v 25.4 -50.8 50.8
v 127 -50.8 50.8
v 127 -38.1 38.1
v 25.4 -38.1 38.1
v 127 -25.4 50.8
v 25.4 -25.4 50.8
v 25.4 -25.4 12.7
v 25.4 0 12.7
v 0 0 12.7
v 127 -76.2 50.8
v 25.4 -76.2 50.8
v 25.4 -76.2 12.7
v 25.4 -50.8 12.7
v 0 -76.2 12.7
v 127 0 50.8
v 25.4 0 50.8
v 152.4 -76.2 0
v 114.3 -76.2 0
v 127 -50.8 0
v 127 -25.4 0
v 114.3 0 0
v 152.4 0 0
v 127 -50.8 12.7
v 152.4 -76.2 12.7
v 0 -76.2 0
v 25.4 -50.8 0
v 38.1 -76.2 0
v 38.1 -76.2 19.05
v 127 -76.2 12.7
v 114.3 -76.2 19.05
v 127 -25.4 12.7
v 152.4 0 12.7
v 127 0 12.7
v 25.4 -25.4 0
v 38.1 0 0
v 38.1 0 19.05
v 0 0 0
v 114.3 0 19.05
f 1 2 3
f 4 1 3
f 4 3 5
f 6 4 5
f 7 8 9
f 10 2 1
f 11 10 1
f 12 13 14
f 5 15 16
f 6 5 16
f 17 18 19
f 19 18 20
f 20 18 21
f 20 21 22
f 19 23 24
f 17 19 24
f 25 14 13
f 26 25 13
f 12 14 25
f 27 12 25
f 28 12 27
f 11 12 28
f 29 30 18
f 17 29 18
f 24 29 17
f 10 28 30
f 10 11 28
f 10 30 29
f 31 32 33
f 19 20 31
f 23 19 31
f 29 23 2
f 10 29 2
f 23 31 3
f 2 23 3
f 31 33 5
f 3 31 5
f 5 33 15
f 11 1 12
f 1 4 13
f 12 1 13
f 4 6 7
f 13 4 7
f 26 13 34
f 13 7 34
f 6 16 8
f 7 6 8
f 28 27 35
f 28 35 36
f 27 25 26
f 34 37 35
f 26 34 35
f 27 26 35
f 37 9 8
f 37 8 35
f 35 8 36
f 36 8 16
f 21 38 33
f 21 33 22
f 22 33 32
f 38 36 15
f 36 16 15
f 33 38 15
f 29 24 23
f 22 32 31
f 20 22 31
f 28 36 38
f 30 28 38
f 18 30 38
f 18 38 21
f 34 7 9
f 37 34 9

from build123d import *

# Parameters (mm, degrees)
F1_DEPTH = 76.2
F3_DEPTH = 25.4
F5_DEPTH = 25.4
F7_DEPTH = 101.6


with BuildPart() as f1:
    # F0 (on Front) → F1 (new body)
    with BuildSketch(Plane.XZ):
        Polygon((0, 12.7), (0, 0), (38.1, 0), (38.1, 19.05), (114.3, 19.05), (114.3, 0), (152.4, 0), (152.4, 12.7), (127, 12.7), (127, 50.8), (25.4, 50.8), (25.4, 12.7), align=None)
    extrude(amount=F1_DEPTH)

    # F2 (on face) → F3 (cut)
    with BuildSketch(Plane.XY.offset(12.7)):
        Polygon((127, -25.4), (127, -50.8), (152.4, -76.2), (152.4, 0), align=None)
    extrude(amount=-F3_DEPTH, mode=Mode.SUBTRACT)

    # F4 (on face) → F5 (cut)
    with BuildSketch(Plane.XY.offset(12.7)):
        Polygon((0, -76.2), (25.4, -50.8), (25.4, -25.4), (0, 0), align=None)
    extrude(amount=-F5_DEPTH, mode=Mode.SUBTRACT)

    # F6 (on face) → F7 (cut)
    with BuildSketch(Plane.YZ.offset(127)):
        Polygon((-25.4, 50.8), (-50.8, 50.8), (-38.1, 38.1), align=None)
    extrude(amount=-F7_DEPTH, mode=Mode.SUBTRACT)


solid = f1.part
